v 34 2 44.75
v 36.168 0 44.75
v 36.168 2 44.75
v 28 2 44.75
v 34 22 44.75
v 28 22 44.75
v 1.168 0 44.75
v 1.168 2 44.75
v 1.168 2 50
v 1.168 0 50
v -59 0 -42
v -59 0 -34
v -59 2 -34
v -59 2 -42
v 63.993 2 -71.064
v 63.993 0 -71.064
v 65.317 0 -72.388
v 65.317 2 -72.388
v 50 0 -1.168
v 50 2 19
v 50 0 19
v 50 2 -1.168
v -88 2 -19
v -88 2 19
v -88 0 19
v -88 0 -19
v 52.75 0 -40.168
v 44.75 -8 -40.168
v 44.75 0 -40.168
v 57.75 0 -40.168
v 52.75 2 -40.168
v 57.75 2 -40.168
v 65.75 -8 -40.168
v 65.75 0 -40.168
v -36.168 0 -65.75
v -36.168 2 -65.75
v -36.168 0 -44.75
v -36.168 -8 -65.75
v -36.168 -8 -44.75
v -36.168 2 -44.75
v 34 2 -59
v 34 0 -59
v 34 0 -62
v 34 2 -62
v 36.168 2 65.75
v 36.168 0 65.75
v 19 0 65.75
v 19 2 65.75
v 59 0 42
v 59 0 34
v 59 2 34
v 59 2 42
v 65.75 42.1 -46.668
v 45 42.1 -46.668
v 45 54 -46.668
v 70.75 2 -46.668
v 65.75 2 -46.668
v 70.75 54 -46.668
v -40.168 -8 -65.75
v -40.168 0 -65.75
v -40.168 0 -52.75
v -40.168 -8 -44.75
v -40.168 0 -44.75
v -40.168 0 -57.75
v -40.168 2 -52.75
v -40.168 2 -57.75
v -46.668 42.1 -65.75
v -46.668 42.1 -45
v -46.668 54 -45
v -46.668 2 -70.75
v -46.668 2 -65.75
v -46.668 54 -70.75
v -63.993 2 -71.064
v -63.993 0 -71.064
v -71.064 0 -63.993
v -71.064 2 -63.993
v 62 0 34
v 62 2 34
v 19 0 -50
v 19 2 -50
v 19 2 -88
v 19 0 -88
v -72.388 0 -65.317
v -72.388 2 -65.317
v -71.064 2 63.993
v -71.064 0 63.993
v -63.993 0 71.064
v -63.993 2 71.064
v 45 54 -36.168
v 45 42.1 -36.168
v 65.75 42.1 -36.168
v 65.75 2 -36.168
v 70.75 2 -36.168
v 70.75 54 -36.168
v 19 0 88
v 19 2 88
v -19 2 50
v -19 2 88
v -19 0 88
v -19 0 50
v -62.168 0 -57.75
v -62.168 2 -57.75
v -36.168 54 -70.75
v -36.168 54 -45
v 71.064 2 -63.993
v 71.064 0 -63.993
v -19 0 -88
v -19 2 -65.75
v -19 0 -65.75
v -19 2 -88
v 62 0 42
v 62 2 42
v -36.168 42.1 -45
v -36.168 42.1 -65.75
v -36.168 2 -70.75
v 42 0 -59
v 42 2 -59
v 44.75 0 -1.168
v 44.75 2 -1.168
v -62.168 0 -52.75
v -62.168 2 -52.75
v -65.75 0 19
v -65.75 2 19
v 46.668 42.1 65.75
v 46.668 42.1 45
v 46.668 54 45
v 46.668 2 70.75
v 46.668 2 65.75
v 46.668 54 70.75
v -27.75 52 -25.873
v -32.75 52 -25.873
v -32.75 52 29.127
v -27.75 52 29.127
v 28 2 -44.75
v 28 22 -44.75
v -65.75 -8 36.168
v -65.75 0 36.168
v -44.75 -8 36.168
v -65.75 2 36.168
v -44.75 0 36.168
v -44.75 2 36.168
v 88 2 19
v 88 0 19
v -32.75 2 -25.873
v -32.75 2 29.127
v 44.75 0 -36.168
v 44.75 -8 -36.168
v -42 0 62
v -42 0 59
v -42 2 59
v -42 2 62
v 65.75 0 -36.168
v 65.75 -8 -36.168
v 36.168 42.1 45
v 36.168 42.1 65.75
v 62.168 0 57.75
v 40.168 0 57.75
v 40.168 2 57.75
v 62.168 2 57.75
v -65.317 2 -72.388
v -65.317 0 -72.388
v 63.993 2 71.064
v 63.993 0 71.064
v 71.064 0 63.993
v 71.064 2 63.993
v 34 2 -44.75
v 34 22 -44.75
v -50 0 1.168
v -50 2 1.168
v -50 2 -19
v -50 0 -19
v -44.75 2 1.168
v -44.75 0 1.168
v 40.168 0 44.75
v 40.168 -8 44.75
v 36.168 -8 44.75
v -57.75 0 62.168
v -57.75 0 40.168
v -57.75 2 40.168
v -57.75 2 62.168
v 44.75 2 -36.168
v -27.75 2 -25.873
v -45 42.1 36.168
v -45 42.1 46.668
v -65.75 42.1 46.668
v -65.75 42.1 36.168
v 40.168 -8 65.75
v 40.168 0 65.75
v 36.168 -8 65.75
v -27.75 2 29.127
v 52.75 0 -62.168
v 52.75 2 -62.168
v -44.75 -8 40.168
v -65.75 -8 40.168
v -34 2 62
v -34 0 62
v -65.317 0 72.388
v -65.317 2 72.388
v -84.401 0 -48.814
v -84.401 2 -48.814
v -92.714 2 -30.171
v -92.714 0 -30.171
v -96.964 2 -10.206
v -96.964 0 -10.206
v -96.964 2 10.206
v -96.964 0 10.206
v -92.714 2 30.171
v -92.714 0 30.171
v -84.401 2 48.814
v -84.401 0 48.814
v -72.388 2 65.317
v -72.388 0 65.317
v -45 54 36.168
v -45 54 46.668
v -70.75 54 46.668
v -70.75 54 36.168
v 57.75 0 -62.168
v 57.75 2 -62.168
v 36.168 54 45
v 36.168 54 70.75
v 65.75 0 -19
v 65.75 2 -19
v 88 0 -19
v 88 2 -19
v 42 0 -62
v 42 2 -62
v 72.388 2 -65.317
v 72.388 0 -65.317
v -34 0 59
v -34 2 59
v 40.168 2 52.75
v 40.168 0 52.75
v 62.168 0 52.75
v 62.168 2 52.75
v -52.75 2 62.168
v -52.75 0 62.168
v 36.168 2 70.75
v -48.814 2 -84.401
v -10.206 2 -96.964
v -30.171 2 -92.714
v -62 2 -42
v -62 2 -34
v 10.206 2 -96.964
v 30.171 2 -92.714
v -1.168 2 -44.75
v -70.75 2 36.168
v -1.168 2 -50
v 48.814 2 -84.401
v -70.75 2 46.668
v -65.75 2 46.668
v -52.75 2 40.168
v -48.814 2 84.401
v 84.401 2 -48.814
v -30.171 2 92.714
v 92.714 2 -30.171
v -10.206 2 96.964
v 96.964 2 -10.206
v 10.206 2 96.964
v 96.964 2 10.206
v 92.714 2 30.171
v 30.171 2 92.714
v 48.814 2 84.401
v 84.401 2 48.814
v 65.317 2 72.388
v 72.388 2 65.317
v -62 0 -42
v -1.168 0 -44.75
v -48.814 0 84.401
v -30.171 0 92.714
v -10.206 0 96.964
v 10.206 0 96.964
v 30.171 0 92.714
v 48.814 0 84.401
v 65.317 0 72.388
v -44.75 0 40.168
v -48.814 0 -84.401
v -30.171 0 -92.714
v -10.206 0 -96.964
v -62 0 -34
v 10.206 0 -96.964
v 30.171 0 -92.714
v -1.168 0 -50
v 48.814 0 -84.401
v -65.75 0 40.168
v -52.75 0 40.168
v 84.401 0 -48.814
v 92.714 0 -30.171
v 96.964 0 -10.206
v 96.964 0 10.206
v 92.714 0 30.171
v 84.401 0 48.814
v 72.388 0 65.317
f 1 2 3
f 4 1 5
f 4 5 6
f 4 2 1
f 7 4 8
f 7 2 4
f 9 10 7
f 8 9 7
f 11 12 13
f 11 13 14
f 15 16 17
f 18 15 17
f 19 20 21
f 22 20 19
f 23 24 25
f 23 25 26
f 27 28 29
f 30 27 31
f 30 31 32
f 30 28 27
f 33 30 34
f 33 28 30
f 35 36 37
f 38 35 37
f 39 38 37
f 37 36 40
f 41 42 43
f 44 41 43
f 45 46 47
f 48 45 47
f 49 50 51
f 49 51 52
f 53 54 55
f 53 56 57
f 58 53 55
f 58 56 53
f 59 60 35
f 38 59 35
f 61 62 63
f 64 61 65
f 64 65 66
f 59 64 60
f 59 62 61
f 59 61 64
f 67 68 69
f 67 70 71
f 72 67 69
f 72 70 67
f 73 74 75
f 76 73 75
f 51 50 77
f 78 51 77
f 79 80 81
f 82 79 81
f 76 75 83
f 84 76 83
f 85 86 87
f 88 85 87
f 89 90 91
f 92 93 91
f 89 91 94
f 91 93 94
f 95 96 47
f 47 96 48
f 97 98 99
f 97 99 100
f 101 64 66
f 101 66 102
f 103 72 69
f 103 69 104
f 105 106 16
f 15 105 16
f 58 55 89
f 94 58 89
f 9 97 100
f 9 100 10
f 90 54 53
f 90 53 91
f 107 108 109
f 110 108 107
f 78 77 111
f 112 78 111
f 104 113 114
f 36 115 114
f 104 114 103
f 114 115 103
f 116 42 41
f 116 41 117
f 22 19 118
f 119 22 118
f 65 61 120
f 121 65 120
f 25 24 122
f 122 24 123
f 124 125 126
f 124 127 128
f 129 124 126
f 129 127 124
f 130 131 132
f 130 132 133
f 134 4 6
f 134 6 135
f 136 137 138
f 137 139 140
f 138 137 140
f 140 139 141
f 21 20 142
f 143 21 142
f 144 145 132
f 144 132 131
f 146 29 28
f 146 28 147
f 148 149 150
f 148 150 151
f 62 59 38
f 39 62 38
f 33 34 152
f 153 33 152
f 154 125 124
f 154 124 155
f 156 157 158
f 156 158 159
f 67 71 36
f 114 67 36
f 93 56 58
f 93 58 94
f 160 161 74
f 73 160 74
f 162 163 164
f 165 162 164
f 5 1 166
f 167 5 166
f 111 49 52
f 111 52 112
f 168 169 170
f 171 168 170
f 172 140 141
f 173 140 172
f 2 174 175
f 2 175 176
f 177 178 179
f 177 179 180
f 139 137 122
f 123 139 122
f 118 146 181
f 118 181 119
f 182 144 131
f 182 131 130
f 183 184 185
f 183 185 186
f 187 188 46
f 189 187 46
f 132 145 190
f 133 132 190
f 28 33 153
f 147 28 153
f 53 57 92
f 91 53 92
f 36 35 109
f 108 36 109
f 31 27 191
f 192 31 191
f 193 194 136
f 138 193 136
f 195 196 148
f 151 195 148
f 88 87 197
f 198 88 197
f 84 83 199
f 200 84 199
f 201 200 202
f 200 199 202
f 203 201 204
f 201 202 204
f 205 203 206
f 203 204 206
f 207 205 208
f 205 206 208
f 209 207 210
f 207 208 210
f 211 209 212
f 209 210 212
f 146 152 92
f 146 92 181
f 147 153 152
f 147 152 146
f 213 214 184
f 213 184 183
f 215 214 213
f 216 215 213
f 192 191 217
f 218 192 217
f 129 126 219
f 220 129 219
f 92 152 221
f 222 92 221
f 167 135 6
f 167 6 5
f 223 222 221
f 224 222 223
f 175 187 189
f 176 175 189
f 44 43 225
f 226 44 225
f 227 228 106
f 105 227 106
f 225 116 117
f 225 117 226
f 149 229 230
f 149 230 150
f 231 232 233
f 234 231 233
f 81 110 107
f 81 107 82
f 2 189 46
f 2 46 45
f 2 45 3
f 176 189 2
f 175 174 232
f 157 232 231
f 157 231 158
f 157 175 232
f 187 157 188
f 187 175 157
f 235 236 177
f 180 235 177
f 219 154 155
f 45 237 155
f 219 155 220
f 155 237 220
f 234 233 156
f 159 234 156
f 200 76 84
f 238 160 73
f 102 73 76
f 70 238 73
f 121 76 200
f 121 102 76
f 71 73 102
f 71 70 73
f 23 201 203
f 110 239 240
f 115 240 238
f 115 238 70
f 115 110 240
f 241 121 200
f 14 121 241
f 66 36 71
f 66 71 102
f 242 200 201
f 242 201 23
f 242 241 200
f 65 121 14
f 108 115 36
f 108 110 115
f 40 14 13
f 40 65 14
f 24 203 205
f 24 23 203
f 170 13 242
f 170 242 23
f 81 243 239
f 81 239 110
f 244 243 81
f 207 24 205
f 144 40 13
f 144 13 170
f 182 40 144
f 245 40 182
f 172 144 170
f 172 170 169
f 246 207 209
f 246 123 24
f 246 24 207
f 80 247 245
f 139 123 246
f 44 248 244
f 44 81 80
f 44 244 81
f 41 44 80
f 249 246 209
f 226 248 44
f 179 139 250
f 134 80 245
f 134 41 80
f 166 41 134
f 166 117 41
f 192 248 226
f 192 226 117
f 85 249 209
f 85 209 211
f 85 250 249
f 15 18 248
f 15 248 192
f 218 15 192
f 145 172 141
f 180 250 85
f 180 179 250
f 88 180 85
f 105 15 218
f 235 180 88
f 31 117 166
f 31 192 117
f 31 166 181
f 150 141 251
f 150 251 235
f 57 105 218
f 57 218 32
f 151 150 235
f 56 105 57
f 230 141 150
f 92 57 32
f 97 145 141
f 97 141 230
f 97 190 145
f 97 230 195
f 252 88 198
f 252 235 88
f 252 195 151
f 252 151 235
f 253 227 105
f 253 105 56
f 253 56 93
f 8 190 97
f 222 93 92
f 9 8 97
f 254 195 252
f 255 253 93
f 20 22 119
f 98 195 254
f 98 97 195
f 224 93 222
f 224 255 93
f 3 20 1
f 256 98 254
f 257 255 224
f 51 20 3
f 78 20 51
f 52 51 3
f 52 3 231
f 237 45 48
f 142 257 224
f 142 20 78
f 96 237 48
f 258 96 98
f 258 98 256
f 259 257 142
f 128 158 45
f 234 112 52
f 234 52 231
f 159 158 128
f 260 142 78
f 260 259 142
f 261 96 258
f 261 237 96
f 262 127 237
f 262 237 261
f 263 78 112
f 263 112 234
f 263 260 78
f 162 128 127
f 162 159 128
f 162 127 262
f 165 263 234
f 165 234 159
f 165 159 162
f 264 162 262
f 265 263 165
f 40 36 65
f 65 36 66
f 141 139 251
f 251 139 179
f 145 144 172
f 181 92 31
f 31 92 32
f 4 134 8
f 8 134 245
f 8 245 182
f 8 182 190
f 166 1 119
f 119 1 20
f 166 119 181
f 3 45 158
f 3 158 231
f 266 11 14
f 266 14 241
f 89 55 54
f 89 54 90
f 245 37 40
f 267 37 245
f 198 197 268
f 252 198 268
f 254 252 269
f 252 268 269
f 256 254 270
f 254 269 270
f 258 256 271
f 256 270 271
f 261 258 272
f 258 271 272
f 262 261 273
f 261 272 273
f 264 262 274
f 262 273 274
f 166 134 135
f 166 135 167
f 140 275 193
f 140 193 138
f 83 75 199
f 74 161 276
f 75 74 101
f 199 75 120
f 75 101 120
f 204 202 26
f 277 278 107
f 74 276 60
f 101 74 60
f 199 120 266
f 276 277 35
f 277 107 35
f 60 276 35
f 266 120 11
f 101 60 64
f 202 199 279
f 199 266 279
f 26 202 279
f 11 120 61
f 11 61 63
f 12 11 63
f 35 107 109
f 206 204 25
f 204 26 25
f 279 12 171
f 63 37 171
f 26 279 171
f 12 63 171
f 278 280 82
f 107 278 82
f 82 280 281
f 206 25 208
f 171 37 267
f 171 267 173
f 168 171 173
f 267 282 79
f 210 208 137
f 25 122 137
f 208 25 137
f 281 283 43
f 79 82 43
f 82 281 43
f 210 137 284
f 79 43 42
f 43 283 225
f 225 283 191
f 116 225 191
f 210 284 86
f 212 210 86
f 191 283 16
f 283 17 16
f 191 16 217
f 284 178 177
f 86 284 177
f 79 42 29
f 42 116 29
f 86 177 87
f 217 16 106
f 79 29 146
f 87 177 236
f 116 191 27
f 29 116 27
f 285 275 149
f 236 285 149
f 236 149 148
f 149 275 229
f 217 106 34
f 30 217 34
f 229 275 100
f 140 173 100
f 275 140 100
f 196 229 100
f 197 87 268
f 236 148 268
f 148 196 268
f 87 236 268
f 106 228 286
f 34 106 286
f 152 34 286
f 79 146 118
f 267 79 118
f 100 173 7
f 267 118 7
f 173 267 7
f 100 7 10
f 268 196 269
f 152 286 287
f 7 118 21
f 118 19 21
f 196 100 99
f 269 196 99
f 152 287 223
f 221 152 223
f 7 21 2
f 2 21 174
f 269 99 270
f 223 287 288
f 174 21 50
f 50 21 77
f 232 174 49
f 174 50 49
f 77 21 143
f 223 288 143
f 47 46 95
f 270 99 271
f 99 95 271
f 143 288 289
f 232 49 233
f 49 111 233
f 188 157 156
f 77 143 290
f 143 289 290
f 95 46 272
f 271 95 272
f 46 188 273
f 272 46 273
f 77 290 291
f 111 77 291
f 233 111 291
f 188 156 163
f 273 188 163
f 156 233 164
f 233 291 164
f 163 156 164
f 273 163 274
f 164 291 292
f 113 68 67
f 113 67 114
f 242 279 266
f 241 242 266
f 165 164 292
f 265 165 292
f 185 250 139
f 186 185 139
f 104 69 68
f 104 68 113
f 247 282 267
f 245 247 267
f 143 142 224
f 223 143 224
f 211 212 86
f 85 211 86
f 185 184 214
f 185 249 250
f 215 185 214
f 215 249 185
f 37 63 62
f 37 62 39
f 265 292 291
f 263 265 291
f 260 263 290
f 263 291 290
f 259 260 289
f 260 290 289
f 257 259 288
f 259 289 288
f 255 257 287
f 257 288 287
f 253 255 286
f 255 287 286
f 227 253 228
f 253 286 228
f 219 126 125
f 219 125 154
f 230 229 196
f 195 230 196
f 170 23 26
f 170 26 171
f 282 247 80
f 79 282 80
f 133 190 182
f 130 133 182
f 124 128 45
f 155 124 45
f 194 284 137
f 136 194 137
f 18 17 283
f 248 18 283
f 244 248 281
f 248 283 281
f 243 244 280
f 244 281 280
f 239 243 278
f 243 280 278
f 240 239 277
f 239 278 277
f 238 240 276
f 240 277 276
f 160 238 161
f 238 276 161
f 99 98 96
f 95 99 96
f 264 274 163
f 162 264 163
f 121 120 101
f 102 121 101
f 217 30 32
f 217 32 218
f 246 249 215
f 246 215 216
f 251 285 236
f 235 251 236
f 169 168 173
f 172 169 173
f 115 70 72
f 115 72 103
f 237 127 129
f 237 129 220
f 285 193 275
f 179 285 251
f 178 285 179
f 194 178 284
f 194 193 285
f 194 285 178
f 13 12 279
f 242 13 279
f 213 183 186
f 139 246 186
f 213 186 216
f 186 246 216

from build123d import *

# Parameters (mm, degrees)
SKETCH1_R                           = 97.5
PLATE_DEPTH                         = 2
SKETCH2_W                           = 38
SKETCH2_H                           = 38
FIN_CLEARANCES_DEPTH                = 2
SKETCH3_W                           = 17.168411885
SKETCH3_H                           = 21
SERVO_CLEARANCE_DEPTH               = 2
SKETCH4_W                           = 4
SKETCH4_H                           = 21
SERVO_LIP_BOTTOM_DEPTH              = 8
SKETCH5_W                           = 10.5
SKETCH5_H                           = 5
SERVO_LIP_TOP_EXTRUSION_DEPTH       = 52
SKETCH6_W                           = 10.5
SKETCH6_H                           = 11.9
SERVO_LIP_TOP_DEPTH                 = 20.75
SKETCH7_W                           = 35
SKETCH7_H                           = 21
SERVO_CLEARANCE_FOR_INSERTION_DEPTH = 2
F_4_SERVO_LIP_EXTRUSIONS_COUNT      = 4
SKETCH8_W                           = 10.5
SKETCH8_H                           = 11.9
BOSS_EXTRUDE6_DEPTH                 = 20.75
SKETCH9_W                           = 10.5
SKETCH9_H                           = 11.9
BOSS_EXTRUDE7_DEPTH                 = 20.75
SKETCH10_W                          = 10.5
SKETCH10_H                          = 11.9
BOSS_EXTRUDE8_DEPTH                 = 20.75
SKETCH11_W                          = 5
SKETCH11_H                          = 55
EBOX_LID_SUPPORT_DEPTH              = 50
CUT_EXTRUDE4_DEPTH                  = 2
CLIP_CLEARANCES_COUNT               = 4
SKETCH13_W                          = 6
SKETCH13_H                          = 89.5
EBOX_BOTTOM_SUPPORT_DEPTH           = 20
SKETCH14_W                          = 22
SKETCH14_H                          = 5
SKETCH14_W_2                        = 3
SKETCH14_H_2                        = 8
CUT_EXTRUDE5_DEPTH                  = 10
CIRPATTERN1_COUNT                   = 4


with BuildPart() as part:
    # Sketch1 → Plate (new body)
    with BuildSketch(Plane(origin=(0, 0, 0), x_dir=(1, 0, 0), z_dir=(0, 1, 0))):
        with Locations(Location((0, 0, 0), (0, 0, 270))):
            Circle(SKETCH1_R)
    extrude(amount=PLATE_DEPTH)

    # Sketch2 → Fin Clearances (cut)
    with BuildSketch(Plane(origin=(0, 2, 0), x_dir=(1, 0, 0), z_dir=(0, 1, 0))):
        with Locations((69, 0)):
            Rectangle(SKETCH2_W, SKETCH2_H)
        with Locations((0, 69)):
            Rectangle(SKETCH2_W, SKETCH2_H)
        with Locations((0, -69)):
            Rectangle(SKETCH2_W, SKETCH2_H)
        with Locations((-69, 0)):
            Rectangle(SKETCH2_W, SKETCH2_H)
    extrude(amount=-FIN_CLEARANCES_DEPTH, mode=Mode.SUBTRACT)

    # Sketch3 → Servo Clearance (cut)
    with BuildSketch(Plane.XZ):
        with Locations((-27.584205943, -55.25)):
            Rectangle(SKETCH3_W, SKETCH3_H)
    servo_clearance = extrude(amount=-SERVO_CLEARANCE_DEPTH, mode=Mode.SUBTRACT)

    # Sketch4 → Servo Lip - Bottom (add)
    with BuildSketch(Plane.XZ):
        with Locations((-38.168411885, -55.25)):
            Rectangle(SKETCH4_W, SKETCH4_H)
    servo_lip_bottom = extrude(amount=SERVO_LIP_BOTTOM_DEPTH)

    # Sketch5 → Servo Lip - Top Extrusion (add)
    with BuildSketch(Plane(origin=(0, 2, 0), x_dir=(1, 0, 0), z_dir=(0, 1, 0))):
        with Locations((-41.418411885, 68.25)):
            Rectangle(SKETCH5_W, SKETCH5_H)
    servo_lip_top_extrusion = extrude(amount=SERVO_LIP_TOP_EXTRUSION_DEPTH)

    # Sketch6 → Servo Lip - Top (add)
    with BuildSketch(Plane.XY.offset(-65.75)):
        with Locations((-41.418411885, 48.05)):
            Rectangle(SKETCH6_W, SKETCH6_H)
    extrude(amount=SERVO_LIP_TOP_DEPTH)

    # Sketch7 → Servo Clearance for Insertion (cut)
    with BuildSketch(Plane.XZ):
        with Locations((-18.668411885, -55.25)):
            Rectangle(SKETCH7_W, SKETCH7_H)
    servo_clearance_for_insertion = extrude(amount=-SERVO_CLEARANCE_FOR_INSERTION_DEPTH, mode=Mode.SUBTRACT)

    # 4 Servo Lip Extrusions: Servo Clearance, Servo Lip - Bottom, Servo Lip - Top Extrusion, Servo Clearance for Insertion ×4 about axis
    f_4_servo_lip_extrusions_axis = Axis((0, 0, 0), (0, 1, 0))
    add([servo_clearance.rotate(f_4_servo_lip_extrusions_axis, i * 360 / F_4_SERVO_LIP_EXTRUSIONS_COUNT) for i in range(1, F_4_SERVO_LIP_EXTRUSIONS_COUNT)], mode=Mode.SUBTRACT)
    add([servo_lip_bottom.rotate(f_4_servo_lip_extrusions_axis, i * 360 / F_4_SERVO_LIP_EXTRUSIONS_COUNT) for i in range(1, F_4_SERVO_LIP_EXTRUSIONS_COUNT)])
    add([servo_lip_top_extrusion.rotate(f_4_servo_lip_extrusions_axis, i * 360 / F_4_SERVO_LIP_EXTRUSIONS_COUNT) for i in range(1, F_4_SERVO_LIP_EXTRUSIONS_COUNT)])
    add([servo_clearance_for_insertion.rotate(f_4_servo_lip_extrusions_axis, i * 360 / F_4_SERVO_LIP_EXTRUSIONS_COUNT) for i in range(1, F_4_SERVO_LIP_EXTRUSIONS_COUNT)], mode=Mode.SUBTRACT)

    # Sketch8 → Boss-Extrude6 (add)
    with BuildSketch(Plane(origin=(-65.75, 0, 0), x_dir=(0, 0, -1), z_dir=(1, 0, 0))):
        with Locations((-41.418411885, 48.05)):
            Rectangle(SKETCH8_W, SKETCH8_H)
    extrude(amount=BOSS_EXTRUDE6_DEPTH)

    # Sketch9 → Boss-Extrude7 (add)
    with BuildSketch(Plane(origin=(0, 0, 65.75), x_dir=(-1, 0, 0), z_dir=(0, 0, -1))):
        with Locations((-41.418411885, 48.05)):
            Rectangle(SKETCH9_W, SKETCH9_H)
    extrude(amount=BOSS_EXTRUDE7_DEPTH)

    # Sketch10 → Boss-Extrude8 (add)
    with BuildSketch(Plane.ZY.offset(-65.75)):
        with Locations((-41.418411885, 48.05)):
            Rectangle(SKETCH10_W, SKETCH10_H)
    extrude(amount=BOSS_EXTRUDE8_DEPTH)

    # Sketch11 → EBox Lid Support (add)
    with BuildSketch(Plane(origin=(0, 2, 0), x_dir=(1, 0, 0), z_dir=(0, 1, 0))):
        with Locations((-30.25, -1.627343475)):
            Rectangle(SKETCH11_W, SKETCH11_H)
    extrude(amount=EBOX_LID_SUPPORT_DEPTH)

    # Sketch12 → Cut-Extrude4 (cut)
    with BuildSketch(Plane.XZ):
        Polygon((-71.064231509, 63.993163697), (-63.993163697, 71.064231509), (-65.40737726, 72.478445072), (-72.478445072, 65.40737726), align=None)
    cut_extrude4 = extrude(amount=-CUT_EXTRUDE4_DEPTH, mode=Mode.SUBTRACT)

    # Clip Clearances: Cut-Extrude4 ×4 about axis
    clip_clearances_axis = Axis((0, 0, 0), (0, 1, 0))
    for i in range(1, CLIP_CLEARANCES_COUNT):
        add(cut_extrude4.rotate(clip_clearances_axis, i * 360 / CLIP_CLEARANCES_COUNT), mode=Mode.SUBTRACT)

    # Sketch13 → EBox Bottom Support (add)
    with BuildSketch(Plane(origin=(0, 2, 0), x_dir=(1, 0, 0), z_dir=(0, 1, 0))):
        with Locations((31, 0)):
            Rectangle(SKETCH13_W, SKETCH13_H)
    extrude(amount=EBOX_BOTTOM_SUPPORT_DEPTH)

    # Sketch14 → Cut-Extrude5 (cut)
    with BuildSketch(Plane.XZ):
        with Locations((51.168411885, 55.25)):
            Rectangle(SKETCH14_W, SKETCH14_H)
        with Locations((60.5, 38)):
            Rectangle(SKETCH14_W_2, SKETCH14_H_2)
    cut_extrude5 = extrude(amount=-CUT_EXTRUDE5_DEPTH, mode=Mode.SUBTRACT)

    # CirPattern1: Cut-Extrude5 ×4 about axis
    cirpattern1_axis = Axis((0, 0, 0), (0, 1, 0))
    for i in range(1, CIRPATTERN1_COUNT):
        add(cut_extrude5.rotate(cirpattern1_axis, i * 360 / CIRPATTERN1_COUNT), mode=Mode.SUBTRACT)


solid = part.part
